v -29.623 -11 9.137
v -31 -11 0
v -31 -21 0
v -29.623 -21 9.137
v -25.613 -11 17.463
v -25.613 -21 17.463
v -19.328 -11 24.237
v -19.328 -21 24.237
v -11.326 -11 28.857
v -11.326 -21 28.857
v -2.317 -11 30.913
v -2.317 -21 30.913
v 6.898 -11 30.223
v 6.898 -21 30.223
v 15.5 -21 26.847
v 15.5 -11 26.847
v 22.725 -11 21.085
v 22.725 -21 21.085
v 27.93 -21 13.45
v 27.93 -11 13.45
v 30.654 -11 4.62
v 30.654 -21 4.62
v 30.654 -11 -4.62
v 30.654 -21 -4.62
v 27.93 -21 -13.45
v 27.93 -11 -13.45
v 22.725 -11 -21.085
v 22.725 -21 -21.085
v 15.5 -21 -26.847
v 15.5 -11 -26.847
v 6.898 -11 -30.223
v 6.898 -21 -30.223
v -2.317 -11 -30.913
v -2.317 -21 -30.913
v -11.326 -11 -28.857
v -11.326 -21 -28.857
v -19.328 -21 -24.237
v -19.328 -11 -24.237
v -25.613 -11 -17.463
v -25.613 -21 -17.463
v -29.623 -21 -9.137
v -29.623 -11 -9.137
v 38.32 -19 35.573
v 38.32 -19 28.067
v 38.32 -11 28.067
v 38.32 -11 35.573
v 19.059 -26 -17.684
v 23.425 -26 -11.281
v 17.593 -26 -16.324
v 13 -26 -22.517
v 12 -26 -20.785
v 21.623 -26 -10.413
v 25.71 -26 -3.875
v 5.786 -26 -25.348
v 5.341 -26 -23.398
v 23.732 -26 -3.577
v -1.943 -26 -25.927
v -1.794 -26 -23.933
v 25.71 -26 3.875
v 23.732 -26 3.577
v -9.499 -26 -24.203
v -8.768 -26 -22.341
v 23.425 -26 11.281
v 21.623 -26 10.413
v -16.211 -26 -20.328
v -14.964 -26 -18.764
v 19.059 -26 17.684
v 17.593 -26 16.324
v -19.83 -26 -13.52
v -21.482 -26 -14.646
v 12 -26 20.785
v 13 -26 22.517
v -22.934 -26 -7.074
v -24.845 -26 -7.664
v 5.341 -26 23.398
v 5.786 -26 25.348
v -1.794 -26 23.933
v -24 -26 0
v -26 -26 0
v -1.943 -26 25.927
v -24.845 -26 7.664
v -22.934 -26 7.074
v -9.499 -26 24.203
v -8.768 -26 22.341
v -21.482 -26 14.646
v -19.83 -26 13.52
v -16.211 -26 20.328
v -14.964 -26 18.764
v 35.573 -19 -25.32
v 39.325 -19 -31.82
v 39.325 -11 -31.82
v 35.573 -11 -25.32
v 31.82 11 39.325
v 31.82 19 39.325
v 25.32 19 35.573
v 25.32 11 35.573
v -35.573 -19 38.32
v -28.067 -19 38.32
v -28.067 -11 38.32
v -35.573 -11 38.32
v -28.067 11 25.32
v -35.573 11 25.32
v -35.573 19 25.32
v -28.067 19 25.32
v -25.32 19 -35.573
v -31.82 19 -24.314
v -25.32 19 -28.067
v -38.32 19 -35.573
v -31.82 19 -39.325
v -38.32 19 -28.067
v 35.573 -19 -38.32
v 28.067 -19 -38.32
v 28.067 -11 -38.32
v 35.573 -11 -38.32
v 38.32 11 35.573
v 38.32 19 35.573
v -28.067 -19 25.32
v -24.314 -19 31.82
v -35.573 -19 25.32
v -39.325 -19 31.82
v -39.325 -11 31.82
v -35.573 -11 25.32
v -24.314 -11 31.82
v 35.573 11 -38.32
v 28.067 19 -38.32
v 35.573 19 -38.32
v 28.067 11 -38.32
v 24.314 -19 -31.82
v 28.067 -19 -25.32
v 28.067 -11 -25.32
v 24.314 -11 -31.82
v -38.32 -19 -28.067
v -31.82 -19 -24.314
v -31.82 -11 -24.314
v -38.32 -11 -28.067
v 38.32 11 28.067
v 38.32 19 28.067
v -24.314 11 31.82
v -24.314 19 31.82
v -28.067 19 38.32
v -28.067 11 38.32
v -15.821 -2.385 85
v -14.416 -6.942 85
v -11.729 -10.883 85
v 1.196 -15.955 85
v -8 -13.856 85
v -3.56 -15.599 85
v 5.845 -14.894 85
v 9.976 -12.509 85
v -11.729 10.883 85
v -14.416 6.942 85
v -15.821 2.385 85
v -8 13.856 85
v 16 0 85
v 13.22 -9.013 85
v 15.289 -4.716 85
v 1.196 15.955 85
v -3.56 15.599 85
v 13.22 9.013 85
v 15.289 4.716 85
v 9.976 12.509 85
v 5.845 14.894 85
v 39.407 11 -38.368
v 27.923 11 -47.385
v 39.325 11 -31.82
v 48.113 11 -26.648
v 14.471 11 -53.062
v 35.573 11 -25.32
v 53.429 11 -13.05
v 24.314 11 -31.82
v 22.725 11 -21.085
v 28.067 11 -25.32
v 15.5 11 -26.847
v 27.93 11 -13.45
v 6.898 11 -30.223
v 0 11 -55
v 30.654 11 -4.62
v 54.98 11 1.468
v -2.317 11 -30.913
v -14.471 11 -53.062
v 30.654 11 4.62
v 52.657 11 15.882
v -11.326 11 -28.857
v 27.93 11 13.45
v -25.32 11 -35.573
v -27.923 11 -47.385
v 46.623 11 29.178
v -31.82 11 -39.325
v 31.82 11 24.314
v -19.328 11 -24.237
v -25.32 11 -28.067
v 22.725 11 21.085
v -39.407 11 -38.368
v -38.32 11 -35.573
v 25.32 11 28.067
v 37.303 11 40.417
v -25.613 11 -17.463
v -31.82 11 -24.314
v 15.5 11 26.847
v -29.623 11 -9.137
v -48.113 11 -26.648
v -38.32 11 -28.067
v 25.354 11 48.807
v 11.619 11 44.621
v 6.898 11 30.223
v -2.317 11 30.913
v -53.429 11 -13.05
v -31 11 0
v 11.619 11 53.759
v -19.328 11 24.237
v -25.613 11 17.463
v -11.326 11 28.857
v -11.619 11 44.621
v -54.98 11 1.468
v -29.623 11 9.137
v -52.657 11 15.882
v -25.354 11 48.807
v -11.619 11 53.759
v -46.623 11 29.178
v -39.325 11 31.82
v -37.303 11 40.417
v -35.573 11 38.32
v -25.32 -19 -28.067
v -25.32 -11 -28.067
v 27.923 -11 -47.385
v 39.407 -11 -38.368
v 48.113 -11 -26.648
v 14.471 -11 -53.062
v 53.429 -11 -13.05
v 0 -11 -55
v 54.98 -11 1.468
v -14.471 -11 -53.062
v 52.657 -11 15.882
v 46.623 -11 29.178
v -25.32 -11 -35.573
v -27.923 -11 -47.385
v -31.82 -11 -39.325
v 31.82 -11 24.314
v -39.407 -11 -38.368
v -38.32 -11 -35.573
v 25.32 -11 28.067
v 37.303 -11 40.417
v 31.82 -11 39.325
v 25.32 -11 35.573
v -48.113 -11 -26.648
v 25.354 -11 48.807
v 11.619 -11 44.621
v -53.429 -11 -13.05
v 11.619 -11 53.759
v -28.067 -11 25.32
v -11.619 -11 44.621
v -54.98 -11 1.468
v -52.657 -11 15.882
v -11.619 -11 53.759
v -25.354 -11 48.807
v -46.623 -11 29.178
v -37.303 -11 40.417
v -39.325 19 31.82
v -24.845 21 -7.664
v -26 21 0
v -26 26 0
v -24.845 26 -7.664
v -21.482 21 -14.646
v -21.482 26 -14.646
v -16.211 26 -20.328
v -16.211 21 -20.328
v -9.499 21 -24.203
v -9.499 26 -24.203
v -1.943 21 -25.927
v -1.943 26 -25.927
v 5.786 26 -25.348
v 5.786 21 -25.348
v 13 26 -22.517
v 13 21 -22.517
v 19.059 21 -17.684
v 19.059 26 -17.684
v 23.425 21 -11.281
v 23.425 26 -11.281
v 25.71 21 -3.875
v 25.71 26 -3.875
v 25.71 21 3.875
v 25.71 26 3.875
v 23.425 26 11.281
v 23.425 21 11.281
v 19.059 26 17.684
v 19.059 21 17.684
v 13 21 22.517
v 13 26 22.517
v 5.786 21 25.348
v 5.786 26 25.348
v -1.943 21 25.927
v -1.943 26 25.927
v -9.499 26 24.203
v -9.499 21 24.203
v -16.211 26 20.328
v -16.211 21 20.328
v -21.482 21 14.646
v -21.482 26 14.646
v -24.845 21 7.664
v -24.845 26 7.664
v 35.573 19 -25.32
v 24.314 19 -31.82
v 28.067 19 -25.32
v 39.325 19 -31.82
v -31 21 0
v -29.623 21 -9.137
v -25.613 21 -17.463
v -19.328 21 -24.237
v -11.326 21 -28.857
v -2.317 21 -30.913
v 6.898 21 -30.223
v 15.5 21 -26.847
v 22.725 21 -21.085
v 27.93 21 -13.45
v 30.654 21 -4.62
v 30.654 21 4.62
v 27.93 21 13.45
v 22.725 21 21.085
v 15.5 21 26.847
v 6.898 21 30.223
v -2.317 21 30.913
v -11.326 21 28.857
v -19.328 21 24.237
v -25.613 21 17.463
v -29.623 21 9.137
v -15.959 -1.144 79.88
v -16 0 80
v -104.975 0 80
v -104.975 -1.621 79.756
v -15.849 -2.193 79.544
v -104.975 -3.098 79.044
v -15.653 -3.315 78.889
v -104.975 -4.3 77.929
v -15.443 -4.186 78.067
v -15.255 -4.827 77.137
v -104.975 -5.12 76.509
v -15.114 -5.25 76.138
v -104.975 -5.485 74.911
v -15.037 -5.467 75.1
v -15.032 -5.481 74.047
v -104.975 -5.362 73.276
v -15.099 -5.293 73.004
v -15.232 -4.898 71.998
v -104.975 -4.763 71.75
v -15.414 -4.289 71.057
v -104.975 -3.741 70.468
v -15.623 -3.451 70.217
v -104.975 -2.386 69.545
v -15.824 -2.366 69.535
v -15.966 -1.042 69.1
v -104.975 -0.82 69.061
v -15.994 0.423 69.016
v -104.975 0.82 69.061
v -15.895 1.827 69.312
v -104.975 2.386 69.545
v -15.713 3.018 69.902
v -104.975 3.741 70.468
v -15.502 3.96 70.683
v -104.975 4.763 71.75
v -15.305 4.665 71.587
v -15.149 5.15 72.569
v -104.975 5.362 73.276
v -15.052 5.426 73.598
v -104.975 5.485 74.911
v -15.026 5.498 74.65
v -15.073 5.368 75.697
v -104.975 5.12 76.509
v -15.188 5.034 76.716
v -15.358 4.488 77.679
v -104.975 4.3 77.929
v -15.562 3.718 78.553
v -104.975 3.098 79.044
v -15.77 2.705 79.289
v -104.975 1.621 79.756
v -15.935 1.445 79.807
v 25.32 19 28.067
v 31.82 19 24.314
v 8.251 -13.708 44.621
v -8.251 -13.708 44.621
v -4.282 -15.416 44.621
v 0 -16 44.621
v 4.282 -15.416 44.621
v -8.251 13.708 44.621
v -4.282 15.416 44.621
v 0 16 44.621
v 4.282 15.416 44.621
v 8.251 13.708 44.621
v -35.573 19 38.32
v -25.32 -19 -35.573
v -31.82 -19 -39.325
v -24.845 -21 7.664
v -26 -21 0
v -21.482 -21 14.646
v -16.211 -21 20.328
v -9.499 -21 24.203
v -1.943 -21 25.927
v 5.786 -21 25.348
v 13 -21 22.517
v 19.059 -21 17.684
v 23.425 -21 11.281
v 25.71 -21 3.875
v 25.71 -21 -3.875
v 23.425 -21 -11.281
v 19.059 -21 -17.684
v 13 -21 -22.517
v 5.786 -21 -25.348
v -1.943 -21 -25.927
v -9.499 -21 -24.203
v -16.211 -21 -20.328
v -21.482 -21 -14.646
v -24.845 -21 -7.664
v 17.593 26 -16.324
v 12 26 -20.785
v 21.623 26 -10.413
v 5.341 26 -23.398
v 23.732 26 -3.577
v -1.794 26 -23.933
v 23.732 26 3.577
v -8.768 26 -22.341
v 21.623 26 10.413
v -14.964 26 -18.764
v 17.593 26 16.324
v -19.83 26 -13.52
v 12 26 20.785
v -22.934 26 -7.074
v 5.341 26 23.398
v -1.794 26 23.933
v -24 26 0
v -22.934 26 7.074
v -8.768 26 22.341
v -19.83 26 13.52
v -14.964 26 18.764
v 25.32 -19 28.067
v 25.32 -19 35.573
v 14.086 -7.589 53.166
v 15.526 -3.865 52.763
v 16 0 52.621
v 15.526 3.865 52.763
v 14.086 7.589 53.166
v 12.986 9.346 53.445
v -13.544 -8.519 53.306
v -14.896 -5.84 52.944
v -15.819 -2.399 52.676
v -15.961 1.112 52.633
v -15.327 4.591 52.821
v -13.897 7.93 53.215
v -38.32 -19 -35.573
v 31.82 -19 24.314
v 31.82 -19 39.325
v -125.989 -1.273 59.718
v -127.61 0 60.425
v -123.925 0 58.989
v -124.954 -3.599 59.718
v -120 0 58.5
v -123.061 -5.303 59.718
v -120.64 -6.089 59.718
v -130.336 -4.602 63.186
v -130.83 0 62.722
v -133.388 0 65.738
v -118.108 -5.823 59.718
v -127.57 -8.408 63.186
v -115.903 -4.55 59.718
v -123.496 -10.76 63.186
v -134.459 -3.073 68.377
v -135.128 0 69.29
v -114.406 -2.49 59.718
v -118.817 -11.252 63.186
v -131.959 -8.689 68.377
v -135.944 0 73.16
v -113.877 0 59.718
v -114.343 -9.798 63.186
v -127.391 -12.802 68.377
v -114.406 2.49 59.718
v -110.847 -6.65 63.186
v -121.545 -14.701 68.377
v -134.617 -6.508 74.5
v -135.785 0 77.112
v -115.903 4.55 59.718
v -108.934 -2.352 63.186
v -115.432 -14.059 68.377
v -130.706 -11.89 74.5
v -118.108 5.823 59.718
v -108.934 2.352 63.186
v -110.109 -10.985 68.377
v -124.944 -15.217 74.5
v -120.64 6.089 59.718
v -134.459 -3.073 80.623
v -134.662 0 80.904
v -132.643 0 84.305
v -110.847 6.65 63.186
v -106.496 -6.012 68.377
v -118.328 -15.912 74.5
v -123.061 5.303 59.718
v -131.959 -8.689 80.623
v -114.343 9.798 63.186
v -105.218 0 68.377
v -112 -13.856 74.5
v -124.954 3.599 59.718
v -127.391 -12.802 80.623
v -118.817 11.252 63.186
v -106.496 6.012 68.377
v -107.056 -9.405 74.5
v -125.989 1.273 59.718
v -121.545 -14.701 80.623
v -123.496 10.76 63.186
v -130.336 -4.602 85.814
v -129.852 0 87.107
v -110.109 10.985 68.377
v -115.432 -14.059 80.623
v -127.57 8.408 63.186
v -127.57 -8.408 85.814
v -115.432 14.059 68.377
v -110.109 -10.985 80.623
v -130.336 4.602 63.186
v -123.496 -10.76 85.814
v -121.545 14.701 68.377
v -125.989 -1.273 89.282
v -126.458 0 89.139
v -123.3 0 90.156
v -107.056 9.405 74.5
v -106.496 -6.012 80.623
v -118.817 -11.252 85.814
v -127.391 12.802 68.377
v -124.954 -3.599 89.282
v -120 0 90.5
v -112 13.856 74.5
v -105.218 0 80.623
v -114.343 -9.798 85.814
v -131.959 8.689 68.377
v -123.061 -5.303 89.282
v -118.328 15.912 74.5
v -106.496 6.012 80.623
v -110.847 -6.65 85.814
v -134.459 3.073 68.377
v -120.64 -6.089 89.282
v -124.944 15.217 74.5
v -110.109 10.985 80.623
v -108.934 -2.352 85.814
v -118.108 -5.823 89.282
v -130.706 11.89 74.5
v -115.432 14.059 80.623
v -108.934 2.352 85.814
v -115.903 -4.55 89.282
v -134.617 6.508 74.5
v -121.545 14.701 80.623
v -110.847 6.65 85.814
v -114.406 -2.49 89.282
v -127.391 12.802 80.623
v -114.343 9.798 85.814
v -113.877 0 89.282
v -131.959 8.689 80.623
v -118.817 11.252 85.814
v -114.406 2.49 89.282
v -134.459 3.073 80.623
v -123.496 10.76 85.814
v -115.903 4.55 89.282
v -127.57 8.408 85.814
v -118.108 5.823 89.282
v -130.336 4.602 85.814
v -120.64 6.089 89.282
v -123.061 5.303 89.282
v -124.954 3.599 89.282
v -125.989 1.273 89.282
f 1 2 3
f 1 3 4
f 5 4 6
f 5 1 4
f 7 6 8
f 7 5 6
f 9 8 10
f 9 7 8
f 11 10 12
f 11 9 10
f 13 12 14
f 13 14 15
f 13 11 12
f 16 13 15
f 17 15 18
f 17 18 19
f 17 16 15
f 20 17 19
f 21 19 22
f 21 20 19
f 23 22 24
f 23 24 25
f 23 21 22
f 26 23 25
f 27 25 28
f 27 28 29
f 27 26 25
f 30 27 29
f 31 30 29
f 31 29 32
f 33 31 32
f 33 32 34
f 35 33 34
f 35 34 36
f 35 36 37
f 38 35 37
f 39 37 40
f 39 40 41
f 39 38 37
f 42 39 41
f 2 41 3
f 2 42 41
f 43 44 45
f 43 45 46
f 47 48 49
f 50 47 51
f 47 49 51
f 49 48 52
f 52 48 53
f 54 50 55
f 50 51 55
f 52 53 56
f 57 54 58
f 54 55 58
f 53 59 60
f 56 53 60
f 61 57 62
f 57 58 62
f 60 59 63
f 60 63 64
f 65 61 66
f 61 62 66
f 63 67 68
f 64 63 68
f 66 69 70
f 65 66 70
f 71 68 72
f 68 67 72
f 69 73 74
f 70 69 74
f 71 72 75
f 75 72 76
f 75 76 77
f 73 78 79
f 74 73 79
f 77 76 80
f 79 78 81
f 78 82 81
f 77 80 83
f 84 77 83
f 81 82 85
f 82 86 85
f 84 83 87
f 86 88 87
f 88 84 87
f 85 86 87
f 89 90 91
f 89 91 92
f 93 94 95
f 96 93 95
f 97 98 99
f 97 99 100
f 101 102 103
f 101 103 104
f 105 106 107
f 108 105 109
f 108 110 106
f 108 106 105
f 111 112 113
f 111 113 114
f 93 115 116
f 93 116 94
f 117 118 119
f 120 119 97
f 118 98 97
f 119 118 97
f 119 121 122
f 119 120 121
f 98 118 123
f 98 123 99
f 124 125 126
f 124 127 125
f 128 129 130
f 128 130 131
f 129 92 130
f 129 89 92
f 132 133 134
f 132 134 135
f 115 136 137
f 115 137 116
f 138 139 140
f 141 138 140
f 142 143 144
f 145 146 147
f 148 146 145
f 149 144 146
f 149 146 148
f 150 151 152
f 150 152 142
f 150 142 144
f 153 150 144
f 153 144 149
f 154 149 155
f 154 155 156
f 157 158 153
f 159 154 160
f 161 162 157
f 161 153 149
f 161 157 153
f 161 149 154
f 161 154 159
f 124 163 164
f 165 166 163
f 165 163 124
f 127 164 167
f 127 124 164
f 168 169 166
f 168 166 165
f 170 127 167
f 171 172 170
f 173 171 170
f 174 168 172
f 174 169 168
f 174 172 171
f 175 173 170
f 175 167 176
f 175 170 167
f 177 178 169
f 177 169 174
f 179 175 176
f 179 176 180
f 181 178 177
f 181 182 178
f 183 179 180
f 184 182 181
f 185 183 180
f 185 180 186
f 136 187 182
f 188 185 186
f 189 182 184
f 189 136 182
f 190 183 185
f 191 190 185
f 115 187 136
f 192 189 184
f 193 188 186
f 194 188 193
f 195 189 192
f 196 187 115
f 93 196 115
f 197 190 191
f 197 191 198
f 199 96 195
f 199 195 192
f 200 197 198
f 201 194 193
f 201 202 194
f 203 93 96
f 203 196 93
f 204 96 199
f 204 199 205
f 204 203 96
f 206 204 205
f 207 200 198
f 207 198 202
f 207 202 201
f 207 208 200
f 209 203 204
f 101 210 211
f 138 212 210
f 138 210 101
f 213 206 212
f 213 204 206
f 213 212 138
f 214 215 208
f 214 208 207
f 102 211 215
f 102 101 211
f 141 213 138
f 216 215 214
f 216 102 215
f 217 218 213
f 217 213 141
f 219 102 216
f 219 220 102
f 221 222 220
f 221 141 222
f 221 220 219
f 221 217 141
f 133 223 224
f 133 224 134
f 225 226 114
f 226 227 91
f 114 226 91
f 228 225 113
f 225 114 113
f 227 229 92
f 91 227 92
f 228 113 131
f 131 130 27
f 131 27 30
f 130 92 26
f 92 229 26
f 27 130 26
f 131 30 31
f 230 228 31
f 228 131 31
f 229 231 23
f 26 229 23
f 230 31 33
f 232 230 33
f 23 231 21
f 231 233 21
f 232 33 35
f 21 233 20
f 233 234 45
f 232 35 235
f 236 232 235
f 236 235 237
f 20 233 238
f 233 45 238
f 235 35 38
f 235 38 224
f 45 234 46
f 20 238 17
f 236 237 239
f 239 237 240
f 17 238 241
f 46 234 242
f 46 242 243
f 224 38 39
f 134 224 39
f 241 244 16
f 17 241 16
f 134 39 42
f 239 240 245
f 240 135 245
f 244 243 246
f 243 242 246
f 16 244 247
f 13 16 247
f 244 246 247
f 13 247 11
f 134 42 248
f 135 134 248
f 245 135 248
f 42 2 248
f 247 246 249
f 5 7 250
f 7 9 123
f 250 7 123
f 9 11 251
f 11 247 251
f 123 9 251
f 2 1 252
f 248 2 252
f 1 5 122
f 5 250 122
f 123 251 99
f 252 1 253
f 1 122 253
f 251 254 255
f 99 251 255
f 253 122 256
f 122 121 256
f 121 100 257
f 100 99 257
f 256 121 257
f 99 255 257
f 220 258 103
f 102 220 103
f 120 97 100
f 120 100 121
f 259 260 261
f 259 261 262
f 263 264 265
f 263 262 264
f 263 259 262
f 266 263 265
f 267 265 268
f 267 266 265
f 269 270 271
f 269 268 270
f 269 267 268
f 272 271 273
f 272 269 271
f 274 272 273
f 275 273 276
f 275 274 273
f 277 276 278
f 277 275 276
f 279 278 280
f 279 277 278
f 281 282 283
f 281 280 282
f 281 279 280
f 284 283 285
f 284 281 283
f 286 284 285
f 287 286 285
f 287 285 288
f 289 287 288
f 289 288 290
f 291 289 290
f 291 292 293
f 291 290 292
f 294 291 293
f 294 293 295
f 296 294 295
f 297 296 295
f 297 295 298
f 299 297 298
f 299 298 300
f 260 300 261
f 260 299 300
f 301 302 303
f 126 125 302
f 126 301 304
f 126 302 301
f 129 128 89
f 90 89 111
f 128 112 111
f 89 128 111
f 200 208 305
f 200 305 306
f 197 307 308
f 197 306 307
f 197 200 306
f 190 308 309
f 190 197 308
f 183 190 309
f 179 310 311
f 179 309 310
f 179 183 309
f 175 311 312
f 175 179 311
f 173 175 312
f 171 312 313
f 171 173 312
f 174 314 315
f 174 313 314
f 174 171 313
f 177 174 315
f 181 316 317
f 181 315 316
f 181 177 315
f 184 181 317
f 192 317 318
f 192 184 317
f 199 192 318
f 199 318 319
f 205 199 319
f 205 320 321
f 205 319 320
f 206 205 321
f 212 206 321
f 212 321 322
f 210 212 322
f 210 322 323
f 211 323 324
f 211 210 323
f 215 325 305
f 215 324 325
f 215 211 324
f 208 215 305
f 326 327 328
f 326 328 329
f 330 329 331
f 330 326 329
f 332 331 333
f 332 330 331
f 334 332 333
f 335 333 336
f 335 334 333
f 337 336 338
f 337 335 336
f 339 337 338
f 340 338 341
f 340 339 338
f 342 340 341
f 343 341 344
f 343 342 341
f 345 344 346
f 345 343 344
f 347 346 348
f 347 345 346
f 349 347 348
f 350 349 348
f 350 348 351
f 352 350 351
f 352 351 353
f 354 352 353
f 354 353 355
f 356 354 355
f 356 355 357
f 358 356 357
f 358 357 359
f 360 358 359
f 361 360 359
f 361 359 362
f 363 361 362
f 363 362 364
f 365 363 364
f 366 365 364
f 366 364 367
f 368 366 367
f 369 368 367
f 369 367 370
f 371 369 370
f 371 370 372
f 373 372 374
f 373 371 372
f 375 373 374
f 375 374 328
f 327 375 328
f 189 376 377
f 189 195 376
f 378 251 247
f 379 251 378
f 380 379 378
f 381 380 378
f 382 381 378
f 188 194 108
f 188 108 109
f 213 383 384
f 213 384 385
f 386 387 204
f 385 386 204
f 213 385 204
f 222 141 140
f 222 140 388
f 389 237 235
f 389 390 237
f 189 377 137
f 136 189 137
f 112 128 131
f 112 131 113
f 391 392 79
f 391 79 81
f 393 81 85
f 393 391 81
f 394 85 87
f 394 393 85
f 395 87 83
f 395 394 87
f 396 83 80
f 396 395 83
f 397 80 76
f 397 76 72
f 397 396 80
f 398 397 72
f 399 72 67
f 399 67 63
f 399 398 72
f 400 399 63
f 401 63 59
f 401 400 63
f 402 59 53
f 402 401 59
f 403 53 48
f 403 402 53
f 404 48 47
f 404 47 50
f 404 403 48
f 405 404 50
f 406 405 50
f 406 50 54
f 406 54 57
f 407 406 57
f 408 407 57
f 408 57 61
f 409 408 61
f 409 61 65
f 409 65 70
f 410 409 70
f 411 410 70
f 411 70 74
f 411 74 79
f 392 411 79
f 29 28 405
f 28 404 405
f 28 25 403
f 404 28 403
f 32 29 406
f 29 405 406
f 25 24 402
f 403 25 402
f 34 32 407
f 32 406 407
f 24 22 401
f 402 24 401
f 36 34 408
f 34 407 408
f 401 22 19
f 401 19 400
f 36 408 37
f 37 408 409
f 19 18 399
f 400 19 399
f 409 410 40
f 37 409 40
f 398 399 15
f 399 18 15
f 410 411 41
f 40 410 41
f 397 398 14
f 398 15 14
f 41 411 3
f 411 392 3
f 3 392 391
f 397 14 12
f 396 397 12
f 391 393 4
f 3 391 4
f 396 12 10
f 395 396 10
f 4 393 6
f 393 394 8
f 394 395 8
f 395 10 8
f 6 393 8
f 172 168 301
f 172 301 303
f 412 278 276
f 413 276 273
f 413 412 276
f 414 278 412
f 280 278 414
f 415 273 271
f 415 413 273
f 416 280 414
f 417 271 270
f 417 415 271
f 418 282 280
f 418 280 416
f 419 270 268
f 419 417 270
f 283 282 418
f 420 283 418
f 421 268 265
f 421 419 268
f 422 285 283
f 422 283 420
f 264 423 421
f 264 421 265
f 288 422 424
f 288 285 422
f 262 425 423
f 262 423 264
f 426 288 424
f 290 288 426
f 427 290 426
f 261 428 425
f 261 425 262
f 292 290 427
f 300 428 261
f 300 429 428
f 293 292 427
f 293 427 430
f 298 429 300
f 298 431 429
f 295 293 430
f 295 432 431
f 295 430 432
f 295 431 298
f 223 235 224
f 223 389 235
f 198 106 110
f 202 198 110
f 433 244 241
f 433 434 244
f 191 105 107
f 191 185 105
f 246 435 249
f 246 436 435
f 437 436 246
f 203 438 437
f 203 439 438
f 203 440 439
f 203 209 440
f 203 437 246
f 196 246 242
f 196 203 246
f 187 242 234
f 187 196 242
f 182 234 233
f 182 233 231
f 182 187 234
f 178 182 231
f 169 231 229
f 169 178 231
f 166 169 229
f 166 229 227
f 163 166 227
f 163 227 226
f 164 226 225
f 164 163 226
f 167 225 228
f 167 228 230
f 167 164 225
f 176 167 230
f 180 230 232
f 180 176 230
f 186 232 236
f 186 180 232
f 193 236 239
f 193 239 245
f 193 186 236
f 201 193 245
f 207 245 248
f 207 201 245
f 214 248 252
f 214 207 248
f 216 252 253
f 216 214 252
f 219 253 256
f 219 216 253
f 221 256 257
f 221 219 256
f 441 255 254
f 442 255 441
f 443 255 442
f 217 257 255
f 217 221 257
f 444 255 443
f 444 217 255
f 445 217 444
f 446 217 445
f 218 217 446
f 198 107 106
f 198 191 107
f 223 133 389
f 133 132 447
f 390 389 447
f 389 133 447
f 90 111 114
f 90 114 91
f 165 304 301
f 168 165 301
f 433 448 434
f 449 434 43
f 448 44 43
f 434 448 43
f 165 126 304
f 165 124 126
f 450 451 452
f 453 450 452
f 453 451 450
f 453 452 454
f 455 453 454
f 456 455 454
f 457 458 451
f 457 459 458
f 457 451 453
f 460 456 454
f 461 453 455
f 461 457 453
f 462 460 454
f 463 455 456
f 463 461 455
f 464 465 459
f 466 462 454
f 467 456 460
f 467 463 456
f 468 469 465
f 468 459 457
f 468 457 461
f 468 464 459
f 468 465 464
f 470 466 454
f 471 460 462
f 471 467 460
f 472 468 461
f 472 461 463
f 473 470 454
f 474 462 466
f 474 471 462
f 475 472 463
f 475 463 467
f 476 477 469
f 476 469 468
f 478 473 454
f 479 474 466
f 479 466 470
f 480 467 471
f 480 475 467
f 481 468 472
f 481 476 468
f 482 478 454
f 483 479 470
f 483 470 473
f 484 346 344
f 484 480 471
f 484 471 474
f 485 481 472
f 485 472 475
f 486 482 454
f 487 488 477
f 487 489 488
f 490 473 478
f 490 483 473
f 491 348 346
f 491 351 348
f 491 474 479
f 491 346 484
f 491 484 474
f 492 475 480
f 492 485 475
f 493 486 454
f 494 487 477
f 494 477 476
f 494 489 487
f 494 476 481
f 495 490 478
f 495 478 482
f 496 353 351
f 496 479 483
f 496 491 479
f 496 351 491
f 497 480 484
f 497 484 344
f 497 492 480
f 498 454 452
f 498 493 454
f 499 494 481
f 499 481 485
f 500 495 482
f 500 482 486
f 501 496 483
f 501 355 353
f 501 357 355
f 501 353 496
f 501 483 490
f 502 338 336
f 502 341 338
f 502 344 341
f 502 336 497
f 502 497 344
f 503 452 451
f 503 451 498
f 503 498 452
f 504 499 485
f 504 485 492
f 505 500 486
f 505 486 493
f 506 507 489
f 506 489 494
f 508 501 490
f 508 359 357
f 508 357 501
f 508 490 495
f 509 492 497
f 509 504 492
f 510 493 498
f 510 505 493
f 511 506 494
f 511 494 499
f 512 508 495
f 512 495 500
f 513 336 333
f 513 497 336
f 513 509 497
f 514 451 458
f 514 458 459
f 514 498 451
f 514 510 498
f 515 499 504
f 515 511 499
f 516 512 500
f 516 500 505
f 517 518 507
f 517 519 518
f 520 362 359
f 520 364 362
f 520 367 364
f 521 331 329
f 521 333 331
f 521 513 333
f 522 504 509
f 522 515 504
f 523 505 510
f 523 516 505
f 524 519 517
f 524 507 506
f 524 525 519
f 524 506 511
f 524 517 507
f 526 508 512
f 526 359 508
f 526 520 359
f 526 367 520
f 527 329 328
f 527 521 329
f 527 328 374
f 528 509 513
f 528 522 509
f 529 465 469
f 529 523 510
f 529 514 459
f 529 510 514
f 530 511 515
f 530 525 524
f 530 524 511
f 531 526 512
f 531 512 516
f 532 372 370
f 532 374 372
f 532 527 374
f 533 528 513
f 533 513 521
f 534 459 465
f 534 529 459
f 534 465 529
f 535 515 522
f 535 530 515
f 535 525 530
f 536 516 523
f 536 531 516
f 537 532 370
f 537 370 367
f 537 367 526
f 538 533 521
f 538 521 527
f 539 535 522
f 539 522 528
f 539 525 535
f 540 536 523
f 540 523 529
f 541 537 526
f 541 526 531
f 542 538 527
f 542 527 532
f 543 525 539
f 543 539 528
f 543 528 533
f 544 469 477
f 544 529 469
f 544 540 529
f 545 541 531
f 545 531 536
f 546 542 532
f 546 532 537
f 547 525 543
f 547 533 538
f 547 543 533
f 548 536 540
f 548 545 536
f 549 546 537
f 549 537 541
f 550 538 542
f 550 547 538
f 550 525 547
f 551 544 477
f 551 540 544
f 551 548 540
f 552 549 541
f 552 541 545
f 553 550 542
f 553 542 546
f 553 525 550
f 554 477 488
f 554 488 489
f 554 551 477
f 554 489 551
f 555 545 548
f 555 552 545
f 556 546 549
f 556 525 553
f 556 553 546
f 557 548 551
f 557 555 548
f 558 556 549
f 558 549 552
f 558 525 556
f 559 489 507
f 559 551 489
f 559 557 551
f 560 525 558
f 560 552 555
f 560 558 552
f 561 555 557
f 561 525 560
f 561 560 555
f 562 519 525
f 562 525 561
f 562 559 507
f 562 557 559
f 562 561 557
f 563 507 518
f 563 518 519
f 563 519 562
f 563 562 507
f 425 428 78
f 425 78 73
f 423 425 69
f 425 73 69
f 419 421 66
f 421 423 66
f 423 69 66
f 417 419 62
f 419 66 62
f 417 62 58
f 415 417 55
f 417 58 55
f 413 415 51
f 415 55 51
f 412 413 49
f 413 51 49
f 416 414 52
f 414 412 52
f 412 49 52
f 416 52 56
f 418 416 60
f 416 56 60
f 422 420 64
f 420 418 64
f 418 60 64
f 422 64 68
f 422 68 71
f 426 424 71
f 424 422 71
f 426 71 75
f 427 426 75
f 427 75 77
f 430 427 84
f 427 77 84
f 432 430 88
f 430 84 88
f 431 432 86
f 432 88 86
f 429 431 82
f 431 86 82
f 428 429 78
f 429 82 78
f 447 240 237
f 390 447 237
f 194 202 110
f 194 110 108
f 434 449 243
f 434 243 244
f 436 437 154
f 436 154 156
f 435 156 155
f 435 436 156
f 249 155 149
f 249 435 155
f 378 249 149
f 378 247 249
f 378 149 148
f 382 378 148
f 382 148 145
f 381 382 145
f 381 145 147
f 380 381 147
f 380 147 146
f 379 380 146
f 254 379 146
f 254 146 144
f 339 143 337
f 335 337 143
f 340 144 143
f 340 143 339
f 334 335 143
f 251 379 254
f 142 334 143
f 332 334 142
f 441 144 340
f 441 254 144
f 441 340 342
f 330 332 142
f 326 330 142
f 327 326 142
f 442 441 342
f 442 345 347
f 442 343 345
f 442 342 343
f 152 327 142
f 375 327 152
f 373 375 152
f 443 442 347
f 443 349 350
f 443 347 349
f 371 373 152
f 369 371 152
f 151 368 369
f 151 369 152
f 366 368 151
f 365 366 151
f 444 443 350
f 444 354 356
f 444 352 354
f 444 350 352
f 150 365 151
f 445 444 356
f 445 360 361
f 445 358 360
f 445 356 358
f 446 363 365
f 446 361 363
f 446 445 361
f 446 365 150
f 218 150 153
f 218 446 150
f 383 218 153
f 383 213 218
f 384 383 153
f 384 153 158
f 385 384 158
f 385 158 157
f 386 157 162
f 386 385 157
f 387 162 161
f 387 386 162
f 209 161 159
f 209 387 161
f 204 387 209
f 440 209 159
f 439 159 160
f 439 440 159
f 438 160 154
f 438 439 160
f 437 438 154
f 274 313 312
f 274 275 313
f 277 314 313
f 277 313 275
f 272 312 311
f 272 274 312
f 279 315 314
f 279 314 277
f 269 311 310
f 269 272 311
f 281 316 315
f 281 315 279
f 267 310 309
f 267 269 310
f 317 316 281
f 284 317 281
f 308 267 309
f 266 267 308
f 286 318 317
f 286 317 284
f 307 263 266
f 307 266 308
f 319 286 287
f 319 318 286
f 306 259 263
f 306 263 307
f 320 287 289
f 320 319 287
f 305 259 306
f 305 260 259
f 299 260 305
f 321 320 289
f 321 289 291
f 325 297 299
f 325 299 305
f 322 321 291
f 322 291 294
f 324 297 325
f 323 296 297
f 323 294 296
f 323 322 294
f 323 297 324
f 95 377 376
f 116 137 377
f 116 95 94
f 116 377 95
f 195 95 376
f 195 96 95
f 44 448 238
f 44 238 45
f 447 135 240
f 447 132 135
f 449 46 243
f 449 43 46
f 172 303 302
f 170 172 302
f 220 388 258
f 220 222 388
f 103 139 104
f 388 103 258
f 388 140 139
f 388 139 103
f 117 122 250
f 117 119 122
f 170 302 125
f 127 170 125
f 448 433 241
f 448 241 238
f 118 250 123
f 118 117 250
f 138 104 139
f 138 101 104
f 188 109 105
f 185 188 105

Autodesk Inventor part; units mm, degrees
ref_plane "YZ Plane" through (0, 0, 0) normal (1, 0, 0) x (0, 1, 0)
ref_plane "XZ Plane" through (0, 0, 0) normal (0, 1, 0) x (-1, 0, 0)
ref_plane "XY Plane" through (0, 0, 0) normal (0, 0, 1) x (1, 0, 0)
sketch "Sketch11" plane through (0, 0, 0) normal (0, 1, 0) x (-1, 0, 0)
  circle A0 centre (0, 0) radius 26
  circle A1 centre (0, 0) radius 24
  circle A2 centre (0, 0) radius 31
  circle A3 centre (0, 0) radius 55
  line L0 (35.5726, 38.3198) -> (39.3254, 31.8198)
  line L1 (39.3254, 31.8198) -> (35.5726, 25.3198)
  line L2 (35.5726, 25.3198) -> (28.067, 25.3198)
  line L3 (28.067, 25.3198) -> (24.3143, 31.8198)
  line L4 (24.3143, 31.8198) -> (28.067, 38.3198)
  line L5 (28.067, 38.3198) -> (35.5726, 38.3198)
  line L6 (0, 0) -> (31.8198, 31.8198) construction
  line L7 (0, 0) -> (45, 0) construction
  line L8 (35.5726, 38.3198) -> (28.067, 25.3198) construction
  line L9 (28.067, 38.3198) -> (35.5726, 25.3198) construction
  line L10 (39.3254, 31.8198) -> (24.3143, 31.8198) construction
  line L11 (0, 52.6213) -> (0, 85)
  line L12 (0, 85) -> (-16, 85)
  line L13 (-16, 85) -> (-16, 52.6213)
  line L14 (0, 74.5) -> (120, 74.5)
  line L15 (120, 74.5) -> (120, 80)
  line L16 (120, 80) -> (0, 80)
  line L17 (0, 80) -> (0, 74.5)
  line L18 (120, 90.5) -> (120, 58.5)
  arc A4 (120, 58.5) -> (120, 90.5) centre (120, 74.5) ccw
  line L19 (-16, 52.6213) -> (0, 52.6213)
  line L20 (0, 52.6213) -> (-16, 52.6213)
  line L21 (-16, 52.6213) -> (-16, 44.6213)
  line L22 (-16, 44.6213) -> (0, 44.6213)
  line L23 (0, 44.6213) -> (0, 52.6213)
  dimension "oOuterDia" = 110
  dimension "oPipeDia" = 52
  dimension "oPipeWall" = 2
  dimension "oPipeLenght" = 5
  dimension "oKdia" = 45
  dimension "d70" = 45
  dimension "oSW" = 13
  dimension "oCenterTop" = 85
  dimension "d78" = 16
  dimension "oHandleLenght" = 120
  dimension "d80" = 5.5
  dimension "d81" = 32
  dimension "d82" = 5
  dimension "d86" = 8
extrude "Extrusion12" add sketch "Sketch11" along normal mid plane 52 contours A0
extrude "Extrusion13" add sketch "Sketch11" along normal mid plane 42 contours A2
extrude "Extrusion14" add sketch "Sketch11" along normal mid plane 22 contours L21 L22 L23 L11 A3 | A3 L11 L19 | L19 L23 L22 L21 | L0 L1 L2 L3 L4 L5
extrude "Extrusion15" add sketch "Sketch11" along normal mid plane 38 contours L0 L1 L2 L3 L4 L5
pattern_circular "Circular Pattern2" count 4 over 360 about axis through (0, 0, 0) along (0, 1, 0) of "Extrusion15"
revolve "Revolution1" add sketch "Sketch11" angle 360 about axis through (0, 0, 52.6213) along (0, 0, 1) contours L13 L12 L11 A3 | A3 L11 L19 | L19 L23 L22 L21
revolve "Revolution2" add sketch "Sketch11" angle 360 about axis through (0, 0, 74.5) along (-1, 0, 0) contours L11 L16 L15 L14
revolve "Revolution3" add sketch "Sketch11" angle 360 about axis through (-120, 0, 90.5) along (0, 0, -1) contours L15 L18 A4
equation "\"d65\" = -2 * oPipeLenght + oValveLenght"
equation "\"oValveLenght\" = 52"
properties part number "MANUAL SANITARY BUTTERFLY VALVE 304L DN50" material "304L"
